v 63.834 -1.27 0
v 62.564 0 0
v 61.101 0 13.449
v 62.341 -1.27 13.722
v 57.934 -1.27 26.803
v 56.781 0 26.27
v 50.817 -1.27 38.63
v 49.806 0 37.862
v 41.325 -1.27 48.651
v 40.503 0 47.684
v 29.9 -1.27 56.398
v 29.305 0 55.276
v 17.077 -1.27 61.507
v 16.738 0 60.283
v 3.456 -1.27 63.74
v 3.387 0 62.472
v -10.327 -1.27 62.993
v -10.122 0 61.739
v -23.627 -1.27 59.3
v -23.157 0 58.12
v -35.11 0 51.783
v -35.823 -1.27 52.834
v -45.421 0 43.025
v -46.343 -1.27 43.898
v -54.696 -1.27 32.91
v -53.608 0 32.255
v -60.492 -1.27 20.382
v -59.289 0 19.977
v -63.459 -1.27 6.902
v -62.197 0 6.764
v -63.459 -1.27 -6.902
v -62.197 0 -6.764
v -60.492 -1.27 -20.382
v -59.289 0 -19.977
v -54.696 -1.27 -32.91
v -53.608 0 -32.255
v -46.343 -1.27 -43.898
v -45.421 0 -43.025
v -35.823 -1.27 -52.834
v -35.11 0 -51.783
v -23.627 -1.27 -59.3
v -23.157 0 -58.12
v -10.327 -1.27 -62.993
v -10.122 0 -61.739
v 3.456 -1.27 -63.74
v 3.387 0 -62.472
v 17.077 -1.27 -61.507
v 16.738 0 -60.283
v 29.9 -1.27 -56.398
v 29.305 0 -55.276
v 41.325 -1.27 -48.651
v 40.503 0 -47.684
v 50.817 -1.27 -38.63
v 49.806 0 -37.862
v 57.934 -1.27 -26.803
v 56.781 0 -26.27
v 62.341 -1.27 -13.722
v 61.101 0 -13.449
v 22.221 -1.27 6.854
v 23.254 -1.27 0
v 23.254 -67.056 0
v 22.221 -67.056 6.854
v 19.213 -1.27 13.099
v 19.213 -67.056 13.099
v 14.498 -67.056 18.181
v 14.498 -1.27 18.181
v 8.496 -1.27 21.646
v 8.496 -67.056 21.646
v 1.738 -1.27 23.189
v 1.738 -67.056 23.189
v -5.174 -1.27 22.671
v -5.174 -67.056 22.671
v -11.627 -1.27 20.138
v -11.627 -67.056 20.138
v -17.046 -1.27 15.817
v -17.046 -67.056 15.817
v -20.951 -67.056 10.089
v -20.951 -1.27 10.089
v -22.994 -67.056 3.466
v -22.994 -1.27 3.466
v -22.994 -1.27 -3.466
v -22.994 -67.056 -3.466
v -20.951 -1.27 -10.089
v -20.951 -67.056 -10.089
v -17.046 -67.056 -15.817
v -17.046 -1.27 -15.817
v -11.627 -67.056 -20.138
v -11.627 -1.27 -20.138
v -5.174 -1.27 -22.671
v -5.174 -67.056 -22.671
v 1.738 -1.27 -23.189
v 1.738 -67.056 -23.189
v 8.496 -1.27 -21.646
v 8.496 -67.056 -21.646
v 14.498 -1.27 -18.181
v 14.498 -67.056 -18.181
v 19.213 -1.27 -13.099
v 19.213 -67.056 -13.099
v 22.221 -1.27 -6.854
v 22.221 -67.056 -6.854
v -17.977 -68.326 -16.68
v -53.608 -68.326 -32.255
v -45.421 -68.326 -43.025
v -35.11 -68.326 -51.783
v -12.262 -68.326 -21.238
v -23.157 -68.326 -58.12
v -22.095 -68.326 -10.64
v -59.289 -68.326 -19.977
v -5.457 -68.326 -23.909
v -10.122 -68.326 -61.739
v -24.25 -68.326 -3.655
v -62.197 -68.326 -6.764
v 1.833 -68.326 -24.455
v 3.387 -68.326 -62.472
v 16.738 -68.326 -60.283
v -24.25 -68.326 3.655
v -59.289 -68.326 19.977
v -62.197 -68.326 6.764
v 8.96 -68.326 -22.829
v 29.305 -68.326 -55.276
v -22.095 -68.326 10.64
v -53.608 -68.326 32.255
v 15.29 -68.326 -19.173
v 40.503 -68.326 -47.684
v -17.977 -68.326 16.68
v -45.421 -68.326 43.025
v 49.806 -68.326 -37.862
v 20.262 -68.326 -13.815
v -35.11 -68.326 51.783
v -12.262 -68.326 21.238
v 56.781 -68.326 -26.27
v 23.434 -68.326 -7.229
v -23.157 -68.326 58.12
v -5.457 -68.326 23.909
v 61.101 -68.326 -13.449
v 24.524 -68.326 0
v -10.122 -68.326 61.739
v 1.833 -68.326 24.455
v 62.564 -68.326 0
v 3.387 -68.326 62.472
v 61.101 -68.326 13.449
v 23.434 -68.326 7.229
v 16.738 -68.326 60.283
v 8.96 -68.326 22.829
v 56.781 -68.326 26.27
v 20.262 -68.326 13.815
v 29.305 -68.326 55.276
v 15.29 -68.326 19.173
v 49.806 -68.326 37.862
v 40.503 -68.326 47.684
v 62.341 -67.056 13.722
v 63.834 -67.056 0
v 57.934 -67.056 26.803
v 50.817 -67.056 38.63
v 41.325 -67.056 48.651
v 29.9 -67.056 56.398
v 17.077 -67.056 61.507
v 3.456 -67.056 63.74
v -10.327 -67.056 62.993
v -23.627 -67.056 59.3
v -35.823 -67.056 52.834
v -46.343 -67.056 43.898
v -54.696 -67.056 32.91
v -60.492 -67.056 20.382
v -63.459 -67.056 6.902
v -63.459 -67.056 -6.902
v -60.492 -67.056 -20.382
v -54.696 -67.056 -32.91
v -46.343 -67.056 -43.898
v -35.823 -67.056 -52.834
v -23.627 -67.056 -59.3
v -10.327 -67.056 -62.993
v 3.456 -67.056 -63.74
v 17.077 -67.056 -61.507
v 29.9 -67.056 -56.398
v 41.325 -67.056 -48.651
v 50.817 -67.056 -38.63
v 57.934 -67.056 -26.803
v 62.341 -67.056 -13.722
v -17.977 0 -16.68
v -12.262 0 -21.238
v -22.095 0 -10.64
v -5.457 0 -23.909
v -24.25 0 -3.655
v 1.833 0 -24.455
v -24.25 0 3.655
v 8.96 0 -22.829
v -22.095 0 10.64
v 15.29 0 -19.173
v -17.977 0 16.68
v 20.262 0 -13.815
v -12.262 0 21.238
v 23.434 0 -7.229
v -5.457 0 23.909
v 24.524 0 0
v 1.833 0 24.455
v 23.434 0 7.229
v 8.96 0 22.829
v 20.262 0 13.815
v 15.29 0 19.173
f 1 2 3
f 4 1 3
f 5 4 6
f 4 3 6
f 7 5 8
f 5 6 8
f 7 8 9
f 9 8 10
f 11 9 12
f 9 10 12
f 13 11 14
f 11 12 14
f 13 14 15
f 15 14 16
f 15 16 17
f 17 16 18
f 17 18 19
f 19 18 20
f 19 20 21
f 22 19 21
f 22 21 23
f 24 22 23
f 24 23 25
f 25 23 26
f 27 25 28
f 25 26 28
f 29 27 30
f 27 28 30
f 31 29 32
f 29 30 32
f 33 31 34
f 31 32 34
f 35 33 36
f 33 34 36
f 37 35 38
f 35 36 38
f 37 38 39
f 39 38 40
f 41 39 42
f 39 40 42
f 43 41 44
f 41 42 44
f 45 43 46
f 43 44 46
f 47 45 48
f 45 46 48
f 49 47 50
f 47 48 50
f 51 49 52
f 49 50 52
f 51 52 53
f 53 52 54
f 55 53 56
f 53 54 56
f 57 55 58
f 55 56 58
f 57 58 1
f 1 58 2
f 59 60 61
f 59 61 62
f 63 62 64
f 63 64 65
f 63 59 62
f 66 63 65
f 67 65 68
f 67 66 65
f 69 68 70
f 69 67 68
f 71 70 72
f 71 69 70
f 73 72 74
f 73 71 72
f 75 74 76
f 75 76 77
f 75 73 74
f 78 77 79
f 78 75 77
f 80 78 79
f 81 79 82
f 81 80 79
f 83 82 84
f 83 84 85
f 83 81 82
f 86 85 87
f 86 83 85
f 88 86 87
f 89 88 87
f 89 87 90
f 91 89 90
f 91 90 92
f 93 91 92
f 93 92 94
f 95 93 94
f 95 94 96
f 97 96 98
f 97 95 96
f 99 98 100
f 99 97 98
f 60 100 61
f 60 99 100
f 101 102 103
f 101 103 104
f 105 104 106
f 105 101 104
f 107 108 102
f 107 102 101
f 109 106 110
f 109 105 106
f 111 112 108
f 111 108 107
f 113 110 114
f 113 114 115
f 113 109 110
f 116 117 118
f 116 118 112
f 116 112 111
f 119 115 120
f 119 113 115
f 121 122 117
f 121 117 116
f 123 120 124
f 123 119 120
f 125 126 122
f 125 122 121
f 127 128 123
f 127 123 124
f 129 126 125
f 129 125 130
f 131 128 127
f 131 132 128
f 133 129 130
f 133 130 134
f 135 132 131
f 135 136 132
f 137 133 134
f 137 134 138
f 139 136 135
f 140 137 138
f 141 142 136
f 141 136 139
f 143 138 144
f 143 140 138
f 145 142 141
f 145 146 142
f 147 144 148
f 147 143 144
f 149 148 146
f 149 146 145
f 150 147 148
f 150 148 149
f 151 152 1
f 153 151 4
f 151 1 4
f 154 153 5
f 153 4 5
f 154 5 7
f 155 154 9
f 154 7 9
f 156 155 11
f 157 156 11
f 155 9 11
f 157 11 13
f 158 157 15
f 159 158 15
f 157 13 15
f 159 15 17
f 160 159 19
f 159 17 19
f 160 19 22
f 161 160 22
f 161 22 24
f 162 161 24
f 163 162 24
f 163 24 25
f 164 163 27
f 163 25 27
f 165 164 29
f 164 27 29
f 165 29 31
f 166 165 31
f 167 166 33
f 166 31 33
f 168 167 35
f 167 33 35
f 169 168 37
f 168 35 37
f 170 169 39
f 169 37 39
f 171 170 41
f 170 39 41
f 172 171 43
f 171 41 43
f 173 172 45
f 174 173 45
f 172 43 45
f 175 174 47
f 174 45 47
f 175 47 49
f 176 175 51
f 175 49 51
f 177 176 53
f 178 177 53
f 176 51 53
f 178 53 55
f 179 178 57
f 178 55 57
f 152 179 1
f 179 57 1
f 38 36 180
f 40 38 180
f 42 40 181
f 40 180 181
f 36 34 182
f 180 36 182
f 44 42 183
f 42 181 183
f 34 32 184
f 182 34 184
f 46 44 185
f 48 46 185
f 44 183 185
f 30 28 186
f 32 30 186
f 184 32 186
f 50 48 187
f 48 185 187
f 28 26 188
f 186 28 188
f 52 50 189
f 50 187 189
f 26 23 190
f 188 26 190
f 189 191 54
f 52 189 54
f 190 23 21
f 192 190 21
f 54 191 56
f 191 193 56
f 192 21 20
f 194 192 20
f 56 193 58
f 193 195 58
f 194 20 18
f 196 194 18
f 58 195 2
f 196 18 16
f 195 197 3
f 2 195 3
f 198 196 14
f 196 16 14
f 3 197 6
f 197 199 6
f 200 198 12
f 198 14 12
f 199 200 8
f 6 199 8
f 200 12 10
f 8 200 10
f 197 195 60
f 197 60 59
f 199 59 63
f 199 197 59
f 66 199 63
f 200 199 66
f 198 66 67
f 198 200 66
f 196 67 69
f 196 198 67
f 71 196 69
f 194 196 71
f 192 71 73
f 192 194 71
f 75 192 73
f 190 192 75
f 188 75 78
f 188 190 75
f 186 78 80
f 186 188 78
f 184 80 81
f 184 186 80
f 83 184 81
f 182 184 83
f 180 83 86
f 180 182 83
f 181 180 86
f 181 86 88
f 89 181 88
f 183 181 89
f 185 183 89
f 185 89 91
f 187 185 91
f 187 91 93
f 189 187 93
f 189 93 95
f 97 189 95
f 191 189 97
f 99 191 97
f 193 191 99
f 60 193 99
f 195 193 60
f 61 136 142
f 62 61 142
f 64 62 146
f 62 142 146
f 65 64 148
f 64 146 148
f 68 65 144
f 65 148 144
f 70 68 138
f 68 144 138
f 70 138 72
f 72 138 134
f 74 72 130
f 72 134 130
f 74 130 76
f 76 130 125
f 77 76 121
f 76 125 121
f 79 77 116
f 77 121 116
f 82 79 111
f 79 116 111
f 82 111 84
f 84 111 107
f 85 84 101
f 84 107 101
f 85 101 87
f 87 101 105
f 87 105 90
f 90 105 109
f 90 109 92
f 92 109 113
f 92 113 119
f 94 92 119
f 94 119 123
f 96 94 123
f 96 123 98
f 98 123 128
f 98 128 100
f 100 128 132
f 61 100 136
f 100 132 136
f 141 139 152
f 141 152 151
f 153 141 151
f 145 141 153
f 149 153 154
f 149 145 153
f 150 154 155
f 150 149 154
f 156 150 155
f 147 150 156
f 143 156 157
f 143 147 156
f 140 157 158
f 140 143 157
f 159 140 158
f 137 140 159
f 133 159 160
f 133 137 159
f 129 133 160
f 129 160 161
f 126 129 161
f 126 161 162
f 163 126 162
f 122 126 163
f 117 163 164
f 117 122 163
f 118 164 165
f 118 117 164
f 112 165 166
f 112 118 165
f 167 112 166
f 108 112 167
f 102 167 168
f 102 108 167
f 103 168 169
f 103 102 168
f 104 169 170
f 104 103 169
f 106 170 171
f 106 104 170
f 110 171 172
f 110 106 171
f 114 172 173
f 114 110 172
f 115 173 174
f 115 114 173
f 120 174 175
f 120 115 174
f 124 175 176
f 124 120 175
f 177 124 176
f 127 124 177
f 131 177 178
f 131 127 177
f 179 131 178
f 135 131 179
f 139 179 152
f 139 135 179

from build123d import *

# Parameters (mm, degrees)
F0_R     = 63.833527
F0_R_2   = 23.253749
F1_DEPTH = 68.326
F2_SIZE  = 1.27


with BuildPart() as f1:
    # F0 (on Front) → F1 (new body)
    with BuildSketch(Plane.XZ):
        Circle(F0_R)
        Circle(F0_R_2, mode=Mode.SUBTRACT)
    extrude(amount=F1_DEPTH)

    # F2
    f2_edges = [f1.edges().sort_by_distance(p)[0] for p in [
        (23.253749, -34.163, 0),
        (-23.253749, 0, 0),
        (-23.253749, -68.326, 0),
        (-63.833527, -68.326, 0),
        (-63.833527, 0, 0),
    ]]
    chamfer(f2_edges, length=F2_SIZE)


solid = f1.part
